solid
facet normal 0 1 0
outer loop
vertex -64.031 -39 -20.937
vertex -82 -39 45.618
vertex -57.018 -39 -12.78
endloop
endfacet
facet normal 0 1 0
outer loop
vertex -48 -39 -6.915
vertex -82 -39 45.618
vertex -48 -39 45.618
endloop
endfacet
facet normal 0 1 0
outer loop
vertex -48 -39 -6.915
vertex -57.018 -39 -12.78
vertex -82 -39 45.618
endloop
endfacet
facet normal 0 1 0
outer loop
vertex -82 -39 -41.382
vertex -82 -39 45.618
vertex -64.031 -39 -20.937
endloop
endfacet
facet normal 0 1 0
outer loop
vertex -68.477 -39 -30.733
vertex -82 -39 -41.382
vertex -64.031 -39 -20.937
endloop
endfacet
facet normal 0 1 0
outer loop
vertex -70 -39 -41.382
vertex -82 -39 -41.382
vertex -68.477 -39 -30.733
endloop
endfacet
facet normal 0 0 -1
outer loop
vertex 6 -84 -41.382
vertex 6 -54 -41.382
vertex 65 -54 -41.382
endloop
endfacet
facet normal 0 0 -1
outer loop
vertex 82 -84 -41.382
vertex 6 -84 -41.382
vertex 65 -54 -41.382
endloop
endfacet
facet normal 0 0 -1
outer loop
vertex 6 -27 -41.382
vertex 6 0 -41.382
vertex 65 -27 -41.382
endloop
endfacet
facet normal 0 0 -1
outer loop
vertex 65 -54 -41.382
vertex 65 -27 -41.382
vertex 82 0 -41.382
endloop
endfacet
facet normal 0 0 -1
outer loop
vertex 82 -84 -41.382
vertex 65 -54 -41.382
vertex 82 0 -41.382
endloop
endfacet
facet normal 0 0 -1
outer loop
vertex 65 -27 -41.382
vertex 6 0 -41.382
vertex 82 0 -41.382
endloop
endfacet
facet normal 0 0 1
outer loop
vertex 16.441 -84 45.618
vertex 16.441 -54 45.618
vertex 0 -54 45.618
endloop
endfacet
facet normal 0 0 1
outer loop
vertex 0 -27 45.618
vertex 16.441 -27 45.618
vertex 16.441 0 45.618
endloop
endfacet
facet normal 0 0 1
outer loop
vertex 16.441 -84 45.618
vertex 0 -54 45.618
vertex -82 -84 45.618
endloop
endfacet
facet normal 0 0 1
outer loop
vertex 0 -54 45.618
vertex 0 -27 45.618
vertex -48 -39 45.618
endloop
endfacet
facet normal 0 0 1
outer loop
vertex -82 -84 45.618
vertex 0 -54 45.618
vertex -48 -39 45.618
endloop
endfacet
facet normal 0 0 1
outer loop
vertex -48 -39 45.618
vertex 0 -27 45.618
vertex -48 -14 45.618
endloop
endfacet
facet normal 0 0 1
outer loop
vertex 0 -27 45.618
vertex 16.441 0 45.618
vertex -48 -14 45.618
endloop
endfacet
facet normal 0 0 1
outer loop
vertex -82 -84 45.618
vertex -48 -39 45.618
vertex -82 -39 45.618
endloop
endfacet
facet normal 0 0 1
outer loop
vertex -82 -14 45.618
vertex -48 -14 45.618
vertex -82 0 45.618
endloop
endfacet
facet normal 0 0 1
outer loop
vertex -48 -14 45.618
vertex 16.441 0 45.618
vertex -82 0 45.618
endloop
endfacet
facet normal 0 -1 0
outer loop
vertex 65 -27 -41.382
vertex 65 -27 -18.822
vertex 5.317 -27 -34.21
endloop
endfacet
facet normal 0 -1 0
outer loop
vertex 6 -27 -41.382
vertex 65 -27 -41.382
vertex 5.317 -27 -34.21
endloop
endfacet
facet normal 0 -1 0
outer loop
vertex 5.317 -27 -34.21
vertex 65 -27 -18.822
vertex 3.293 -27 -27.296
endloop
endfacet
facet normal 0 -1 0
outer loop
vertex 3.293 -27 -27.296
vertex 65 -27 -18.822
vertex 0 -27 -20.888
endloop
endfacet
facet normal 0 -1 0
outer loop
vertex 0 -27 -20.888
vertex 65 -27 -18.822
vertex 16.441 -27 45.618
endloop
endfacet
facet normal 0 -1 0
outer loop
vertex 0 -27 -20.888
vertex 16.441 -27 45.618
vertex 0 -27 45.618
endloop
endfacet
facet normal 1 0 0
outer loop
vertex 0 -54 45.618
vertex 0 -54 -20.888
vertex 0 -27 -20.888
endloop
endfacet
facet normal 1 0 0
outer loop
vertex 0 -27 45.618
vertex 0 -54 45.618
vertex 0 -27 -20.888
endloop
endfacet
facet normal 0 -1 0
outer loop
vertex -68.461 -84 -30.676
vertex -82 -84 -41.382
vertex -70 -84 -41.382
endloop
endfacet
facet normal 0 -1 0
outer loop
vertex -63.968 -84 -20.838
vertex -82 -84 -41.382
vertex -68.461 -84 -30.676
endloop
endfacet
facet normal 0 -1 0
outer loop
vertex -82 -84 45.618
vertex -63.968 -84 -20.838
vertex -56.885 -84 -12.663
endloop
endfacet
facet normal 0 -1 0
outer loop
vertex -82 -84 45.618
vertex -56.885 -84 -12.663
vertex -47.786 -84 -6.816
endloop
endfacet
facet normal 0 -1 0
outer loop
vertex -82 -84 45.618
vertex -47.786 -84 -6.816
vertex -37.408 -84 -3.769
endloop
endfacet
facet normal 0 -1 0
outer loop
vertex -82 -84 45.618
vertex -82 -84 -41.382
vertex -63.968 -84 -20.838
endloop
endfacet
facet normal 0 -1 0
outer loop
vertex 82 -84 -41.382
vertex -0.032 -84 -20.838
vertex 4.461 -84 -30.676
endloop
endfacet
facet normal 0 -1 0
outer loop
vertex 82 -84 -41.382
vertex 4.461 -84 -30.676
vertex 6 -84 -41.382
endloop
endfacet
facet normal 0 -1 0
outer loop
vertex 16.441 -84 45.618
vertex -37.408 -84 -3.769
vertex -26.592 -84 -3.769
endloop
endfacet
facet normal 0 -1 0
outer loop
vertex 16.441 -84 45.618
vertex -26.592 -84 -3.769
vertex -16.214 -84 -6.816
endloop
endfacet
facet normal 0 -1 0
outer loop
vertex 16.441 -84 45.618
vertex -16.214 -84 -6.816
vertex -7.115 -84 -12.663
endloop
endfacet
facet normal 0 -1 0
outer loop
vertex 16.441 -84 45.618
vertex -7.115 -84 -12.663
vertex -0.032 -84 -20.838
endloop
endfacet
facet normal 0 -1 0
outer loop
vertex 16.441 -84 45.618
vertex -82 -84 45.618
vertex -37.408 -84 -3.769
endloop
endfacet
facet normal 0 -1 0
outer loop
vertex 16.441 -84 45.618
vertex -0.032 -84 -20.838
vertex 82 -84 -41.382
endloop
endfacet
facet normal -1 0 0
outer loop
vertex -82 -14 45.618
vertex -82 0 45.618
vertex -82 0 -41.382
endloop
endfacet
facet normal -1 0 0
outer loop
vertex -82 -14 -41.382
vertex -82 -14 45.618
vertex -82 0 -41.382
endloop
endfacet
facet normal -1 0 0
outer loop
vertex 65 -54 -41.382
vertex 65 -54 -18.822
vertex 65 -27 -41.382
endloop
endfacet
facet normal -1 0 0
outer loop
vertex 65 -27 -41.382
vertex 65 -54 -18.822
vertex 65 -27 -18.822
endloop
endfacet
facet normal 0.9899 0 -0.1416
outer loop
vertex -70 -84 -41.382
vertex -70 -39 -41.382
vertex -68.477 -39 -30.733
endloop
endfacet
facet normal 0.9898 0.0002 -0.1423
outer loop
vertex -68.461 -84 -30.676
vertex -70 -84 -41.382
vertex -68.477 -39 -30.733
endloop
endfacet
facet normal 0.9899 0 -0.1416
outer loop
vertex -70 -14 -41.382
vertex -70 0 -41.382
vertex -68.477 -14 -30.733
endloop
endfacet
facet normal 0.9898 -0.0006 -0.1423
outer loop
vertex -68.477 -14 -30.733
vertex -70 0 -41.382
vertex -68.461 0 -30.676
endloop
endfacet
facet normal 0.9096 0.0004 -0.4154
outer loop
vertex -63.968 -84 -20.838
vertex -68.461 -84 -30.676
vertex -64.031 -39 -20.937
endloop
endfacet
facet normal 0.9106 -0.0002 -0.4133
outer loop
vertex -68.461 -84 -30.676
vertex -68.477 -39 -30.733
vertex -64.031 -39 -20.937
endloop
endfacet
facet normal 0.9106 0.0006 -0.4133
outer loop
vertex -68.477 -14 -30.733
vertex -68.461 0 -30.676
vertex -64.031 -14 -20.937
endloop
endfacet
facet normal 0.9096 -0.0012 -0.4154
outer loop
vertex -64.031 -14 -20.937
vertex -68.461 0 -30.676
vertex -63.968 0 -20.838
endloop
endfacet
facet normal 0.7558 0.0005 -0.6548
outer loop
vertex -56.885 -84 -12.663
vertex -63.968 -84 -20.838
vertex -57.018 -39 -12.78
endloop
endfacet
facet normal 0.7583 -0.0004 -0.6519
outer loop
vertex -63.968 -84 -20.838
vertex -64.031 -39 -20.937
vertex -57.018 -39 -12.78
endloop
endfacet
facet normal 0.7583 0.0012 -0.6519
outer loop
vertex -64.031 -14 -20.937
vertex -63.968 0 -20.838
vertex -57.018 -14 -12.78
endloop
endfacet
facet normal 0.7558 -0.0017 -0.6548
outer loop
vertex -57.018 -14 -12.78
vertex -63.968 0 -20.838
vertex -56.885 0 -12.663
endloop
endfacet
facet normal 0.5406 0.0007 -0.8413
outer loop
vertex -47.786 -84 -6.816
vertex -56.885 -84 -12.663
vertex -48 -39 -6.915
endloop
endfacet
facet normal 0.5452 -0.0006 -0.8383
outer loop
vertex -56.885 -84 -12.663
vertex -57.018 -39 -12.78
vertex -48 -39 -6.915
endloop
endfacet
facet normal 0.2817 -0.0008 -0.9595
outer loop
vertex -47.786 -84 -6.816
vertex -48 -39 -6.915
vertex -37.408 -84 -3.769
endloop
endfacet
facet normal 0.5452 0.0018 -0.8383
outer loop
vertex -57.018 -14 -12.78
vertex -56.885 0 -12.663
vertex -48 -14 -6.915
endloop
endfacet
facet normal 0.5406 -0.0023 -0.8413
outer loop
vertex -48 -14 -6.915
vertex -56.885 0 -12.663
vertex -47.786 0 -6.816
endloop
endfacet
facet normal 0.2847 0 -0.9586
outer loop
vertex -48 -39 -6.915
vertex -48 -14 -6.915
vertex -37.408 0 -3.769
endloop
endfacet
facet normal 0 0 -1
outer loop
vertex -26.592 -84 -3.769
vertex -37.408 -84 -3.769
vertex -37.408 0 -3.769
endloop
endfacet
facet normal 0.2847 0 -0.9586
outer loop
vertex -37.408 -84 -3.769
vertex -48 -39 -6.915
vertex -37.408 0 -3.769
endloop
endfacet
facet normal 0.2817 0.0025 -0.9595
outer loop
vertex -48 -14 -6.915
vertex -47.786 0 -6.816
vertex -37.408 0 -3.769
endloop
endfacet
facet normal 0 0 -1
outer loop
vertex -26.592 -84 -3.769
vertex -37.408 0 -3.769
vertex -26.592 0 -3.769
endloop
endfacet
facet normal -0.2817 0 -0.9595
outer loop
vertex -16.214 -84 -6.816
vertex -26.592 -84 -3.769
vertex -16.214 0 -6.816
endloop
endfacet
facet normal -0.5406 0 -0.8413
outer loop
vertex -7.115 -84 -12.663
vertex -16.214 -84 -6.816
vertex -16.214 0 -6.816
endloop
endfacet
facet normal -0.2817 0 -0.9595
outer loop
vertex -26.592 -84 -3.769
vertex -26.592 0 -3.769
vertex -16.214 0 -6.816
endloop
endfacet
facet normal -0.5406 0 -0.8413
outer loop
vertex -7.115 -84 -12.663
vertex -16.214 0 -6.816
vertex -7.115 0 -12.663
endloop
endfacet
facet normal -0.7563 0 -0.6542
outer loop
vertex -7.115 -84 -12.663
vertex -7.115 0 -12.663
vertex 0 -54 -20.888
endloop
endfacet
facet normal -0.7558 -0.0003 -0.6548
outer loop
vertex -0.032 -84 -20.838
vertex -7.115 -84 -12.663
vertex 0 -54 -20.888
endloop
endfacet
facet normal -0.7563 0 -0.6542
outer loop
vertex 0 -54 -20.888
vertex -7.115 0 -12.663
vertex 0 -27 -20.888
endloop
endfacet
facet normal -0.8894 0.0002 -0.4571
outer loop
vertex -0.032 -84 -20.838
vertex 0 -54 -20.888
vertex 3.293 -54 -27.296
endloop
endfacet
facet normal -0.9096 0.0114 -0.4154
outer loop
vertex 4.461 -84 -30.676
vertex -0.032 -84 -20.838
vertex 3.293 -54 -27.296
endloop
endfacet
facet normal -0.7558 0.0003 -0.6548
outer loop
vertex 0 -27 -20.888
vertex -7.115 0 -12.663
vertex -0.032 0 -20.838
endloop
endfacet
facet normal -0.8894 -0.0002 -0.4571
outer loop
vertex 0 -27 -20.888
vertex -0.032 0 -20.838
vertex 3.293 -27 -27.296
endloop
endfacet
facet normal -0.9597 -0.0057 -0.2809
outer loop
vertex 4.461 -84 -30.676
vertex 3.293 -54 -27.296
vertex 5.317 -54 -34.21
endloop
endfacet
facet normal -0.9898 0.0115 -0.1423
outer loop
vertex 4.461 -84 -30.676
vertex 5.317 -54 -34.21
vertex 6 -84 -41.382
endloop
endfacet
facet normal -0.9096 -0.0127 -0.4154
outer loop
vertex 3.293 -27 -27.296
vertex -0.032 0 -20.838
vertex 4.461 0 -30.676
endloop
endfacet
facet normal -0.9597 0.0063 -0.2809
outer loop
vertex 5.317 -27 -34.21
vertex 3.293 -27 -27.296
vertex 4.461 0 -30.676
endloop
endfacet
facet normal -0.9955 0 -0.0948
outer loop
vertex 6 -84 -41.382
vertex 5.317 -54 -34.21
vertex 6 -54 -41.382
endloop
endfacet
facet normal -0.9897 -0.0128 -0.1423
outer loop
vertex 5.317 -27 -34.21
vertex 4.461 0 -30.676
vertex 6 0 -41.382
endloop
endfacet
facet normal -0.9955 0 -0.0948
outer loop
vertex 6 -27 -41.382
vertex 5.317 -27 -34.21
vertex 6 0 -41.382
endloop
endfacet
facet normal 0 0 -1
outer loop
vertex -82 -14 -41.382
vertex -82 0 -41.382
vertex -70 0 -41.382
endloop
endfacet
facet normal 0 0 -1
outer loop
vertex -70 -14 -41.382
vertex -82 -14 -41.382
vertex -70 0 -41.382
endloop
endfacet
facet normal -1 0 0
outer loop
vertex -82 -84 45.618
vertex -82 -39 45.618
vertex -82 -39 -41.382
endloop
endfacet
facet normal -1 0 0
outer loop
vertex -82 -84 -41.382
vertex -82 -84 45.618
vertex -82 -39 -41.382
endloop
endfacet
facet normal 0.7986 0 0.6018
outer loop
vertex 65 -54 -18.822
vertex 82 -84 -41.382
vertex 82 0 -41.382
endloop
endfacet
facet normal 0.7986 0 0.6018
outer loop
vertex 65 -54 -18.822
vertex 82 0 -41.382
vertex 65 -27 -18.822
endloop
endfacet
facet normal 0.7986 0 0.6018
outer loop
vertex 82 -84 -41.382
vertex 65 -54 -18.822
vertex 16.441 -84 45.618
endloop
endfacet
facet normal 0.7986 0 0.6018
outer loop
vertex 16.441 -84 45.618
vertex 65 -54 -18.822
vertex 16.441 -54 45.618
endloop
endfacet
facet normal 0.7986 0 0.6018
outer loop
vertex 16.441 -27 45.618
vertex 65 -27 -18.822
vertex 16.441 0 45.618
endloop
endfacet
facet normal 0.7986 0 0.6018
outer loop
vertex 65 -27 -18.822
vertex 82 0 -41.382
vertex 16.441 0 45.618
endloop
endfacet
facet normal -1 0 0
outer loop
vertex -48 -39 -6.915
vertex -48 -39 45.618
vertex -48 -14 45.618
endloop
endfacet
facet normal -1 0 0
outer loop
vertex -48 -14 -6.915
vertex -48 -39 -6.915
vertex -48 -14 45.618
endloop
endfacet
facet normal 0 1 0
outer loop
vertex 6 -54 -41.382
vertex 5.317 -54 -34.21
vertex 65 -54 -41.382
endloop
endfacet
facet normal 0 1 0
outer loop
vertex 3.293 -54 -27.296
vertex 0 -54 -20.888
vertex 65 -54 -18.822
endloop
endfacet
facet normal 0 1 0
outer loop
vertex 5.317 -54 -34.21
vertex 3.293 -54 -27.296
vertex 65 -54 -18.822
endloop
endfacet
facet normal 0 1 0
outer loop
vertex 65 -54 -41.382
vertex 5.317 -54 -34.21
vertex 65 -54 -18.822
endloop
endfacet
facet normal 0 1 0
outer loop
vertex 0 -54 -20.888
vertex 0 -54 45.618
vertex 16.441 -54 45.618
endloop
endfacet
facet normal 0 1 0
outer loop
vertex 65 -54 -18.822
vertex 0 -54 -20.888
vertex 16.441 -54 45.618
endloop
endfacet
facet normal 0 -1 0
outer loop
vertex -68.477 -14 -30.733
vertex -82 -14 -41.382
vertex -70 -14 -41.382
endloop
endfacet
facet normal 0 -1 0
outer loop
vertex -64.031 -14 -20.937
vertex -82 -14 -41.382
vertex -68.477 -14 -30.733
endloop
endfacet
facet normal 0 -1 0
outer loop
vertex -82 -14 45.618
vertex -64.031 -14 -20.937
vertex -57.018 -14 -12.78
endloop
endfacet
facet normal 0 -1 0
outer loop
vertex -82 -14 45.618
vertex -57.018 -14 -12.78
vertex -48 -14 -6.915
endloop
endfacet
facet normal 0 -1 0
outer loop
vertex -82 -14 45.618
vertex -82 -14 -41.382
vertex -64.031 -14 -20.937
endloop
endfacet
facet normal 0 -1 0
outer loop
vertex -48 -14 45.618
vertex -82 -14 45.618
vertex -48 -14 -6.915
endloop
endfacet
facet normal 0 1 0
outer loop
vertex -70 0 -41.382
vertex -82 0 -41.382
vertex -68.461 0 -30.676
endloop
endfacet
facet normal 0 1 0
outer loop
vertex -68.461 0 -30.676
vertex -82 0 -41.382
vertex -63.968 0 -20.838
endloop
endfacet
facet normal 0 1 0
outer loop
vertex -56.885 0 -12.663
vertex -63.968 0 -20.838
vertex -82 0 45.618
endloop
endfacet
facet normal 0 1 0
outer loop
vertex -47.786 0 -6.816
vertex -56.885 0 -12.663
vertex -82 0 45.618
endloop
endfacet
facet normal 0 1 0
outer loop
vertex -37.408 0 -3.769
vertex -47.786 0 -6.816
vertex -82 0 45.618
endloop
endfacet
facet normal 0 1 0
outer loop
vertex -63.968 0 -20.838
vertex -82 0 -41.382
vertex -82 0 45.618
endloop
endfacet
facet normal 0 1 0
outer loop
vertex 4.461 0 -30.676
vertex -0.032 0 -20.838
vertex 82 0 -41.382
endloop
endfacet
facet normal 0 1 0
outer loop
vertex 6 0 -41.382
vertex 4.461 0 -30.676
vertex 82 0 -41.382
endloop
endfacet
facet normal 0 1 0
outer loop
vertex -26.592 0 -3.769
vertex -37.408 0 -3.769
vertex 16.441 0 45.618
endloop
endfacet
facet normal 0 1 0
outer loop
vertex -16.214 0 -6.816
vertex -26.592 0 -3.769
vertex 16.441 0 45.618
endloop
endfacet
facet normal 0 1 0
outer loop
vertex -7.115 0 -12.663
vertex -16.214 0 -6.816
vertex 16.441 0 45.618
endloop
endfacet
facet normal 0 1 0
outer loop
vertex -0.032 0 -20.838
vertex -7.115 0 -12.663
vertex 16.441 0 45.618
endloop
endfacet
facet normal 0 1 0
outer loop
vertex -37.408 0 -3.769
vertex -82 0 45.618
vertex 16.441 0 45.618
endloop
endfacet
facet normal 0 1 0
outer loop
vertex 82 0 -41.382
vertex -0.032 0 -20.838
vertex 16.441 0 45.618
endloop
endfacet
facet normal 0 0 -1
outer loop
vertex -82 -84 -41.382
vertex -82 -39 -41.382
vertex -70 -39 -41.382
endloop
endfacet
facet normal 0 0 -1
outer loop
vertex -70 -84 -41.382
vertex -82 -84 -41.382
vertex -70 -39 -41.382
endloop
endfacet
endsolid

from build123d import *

# Parameters (mm, degrees)
F1_DEPTH      = 84
F2_W          = 34
F2_H          = 25
F3_DEPTH      = 94.8
F3_DEPTH_BACK = 151.8
F4_W          = 48.559
F4_H          = 27
F4_W_2        = 16.441
F5_DEPTH      = 360.4


with BuildPart() as f1:
    # F0 (on Front) → F1 (new body)
    with BuildSketch(Plane.XZ):
        with BuildLine():
            Line((0, 45.618019), (-82, 45.618019))
            Line((-82, 45.618019), (-82, -41.381981))
            Line((-82, -41.381981), (-70, -41.381981))
            ThreePointArc((-70, -41.381981), (-32, -3.381981), (6, -41.381981))
            Line((6, -41.381981), (82, -41.381981))
            Line((82, -41.381981), (16.441, 45.618019))
            Line((16.441, 45.618019), (0, 45.618019))
        make_face()
    extrude(amount=F1_DEPTH)

    # F2 (on Top) → F3 (cut, two sides)
    with BuildSketch(Plane.XY) as f3_sk:
        with Locations((-65, -26.5)):
            Rectangle(F2_W, F2_H)
    extrude(amount=F3_DEPTH, mode=Mode.SUBTRACT)
    extrude(f3_sk.sketch, amount=-F3_DEPTH_BACK, mode=Mode.SUBTRACT)

    # F4 (on face) → F5 (cut)
    with BuildSketch(Plane.XY.offset(45.618019)):
        with Locations((40.7205, -40.5)):
            Rectangle(F4_W, F4_H)
        with Locations((8.2205, -40.5)):
            Rectangle(F4_W_2, F4_H)
    extrude(amount=-F5_DEPTH, mode=Mode.SUBTRACT)


solid = f1.part
